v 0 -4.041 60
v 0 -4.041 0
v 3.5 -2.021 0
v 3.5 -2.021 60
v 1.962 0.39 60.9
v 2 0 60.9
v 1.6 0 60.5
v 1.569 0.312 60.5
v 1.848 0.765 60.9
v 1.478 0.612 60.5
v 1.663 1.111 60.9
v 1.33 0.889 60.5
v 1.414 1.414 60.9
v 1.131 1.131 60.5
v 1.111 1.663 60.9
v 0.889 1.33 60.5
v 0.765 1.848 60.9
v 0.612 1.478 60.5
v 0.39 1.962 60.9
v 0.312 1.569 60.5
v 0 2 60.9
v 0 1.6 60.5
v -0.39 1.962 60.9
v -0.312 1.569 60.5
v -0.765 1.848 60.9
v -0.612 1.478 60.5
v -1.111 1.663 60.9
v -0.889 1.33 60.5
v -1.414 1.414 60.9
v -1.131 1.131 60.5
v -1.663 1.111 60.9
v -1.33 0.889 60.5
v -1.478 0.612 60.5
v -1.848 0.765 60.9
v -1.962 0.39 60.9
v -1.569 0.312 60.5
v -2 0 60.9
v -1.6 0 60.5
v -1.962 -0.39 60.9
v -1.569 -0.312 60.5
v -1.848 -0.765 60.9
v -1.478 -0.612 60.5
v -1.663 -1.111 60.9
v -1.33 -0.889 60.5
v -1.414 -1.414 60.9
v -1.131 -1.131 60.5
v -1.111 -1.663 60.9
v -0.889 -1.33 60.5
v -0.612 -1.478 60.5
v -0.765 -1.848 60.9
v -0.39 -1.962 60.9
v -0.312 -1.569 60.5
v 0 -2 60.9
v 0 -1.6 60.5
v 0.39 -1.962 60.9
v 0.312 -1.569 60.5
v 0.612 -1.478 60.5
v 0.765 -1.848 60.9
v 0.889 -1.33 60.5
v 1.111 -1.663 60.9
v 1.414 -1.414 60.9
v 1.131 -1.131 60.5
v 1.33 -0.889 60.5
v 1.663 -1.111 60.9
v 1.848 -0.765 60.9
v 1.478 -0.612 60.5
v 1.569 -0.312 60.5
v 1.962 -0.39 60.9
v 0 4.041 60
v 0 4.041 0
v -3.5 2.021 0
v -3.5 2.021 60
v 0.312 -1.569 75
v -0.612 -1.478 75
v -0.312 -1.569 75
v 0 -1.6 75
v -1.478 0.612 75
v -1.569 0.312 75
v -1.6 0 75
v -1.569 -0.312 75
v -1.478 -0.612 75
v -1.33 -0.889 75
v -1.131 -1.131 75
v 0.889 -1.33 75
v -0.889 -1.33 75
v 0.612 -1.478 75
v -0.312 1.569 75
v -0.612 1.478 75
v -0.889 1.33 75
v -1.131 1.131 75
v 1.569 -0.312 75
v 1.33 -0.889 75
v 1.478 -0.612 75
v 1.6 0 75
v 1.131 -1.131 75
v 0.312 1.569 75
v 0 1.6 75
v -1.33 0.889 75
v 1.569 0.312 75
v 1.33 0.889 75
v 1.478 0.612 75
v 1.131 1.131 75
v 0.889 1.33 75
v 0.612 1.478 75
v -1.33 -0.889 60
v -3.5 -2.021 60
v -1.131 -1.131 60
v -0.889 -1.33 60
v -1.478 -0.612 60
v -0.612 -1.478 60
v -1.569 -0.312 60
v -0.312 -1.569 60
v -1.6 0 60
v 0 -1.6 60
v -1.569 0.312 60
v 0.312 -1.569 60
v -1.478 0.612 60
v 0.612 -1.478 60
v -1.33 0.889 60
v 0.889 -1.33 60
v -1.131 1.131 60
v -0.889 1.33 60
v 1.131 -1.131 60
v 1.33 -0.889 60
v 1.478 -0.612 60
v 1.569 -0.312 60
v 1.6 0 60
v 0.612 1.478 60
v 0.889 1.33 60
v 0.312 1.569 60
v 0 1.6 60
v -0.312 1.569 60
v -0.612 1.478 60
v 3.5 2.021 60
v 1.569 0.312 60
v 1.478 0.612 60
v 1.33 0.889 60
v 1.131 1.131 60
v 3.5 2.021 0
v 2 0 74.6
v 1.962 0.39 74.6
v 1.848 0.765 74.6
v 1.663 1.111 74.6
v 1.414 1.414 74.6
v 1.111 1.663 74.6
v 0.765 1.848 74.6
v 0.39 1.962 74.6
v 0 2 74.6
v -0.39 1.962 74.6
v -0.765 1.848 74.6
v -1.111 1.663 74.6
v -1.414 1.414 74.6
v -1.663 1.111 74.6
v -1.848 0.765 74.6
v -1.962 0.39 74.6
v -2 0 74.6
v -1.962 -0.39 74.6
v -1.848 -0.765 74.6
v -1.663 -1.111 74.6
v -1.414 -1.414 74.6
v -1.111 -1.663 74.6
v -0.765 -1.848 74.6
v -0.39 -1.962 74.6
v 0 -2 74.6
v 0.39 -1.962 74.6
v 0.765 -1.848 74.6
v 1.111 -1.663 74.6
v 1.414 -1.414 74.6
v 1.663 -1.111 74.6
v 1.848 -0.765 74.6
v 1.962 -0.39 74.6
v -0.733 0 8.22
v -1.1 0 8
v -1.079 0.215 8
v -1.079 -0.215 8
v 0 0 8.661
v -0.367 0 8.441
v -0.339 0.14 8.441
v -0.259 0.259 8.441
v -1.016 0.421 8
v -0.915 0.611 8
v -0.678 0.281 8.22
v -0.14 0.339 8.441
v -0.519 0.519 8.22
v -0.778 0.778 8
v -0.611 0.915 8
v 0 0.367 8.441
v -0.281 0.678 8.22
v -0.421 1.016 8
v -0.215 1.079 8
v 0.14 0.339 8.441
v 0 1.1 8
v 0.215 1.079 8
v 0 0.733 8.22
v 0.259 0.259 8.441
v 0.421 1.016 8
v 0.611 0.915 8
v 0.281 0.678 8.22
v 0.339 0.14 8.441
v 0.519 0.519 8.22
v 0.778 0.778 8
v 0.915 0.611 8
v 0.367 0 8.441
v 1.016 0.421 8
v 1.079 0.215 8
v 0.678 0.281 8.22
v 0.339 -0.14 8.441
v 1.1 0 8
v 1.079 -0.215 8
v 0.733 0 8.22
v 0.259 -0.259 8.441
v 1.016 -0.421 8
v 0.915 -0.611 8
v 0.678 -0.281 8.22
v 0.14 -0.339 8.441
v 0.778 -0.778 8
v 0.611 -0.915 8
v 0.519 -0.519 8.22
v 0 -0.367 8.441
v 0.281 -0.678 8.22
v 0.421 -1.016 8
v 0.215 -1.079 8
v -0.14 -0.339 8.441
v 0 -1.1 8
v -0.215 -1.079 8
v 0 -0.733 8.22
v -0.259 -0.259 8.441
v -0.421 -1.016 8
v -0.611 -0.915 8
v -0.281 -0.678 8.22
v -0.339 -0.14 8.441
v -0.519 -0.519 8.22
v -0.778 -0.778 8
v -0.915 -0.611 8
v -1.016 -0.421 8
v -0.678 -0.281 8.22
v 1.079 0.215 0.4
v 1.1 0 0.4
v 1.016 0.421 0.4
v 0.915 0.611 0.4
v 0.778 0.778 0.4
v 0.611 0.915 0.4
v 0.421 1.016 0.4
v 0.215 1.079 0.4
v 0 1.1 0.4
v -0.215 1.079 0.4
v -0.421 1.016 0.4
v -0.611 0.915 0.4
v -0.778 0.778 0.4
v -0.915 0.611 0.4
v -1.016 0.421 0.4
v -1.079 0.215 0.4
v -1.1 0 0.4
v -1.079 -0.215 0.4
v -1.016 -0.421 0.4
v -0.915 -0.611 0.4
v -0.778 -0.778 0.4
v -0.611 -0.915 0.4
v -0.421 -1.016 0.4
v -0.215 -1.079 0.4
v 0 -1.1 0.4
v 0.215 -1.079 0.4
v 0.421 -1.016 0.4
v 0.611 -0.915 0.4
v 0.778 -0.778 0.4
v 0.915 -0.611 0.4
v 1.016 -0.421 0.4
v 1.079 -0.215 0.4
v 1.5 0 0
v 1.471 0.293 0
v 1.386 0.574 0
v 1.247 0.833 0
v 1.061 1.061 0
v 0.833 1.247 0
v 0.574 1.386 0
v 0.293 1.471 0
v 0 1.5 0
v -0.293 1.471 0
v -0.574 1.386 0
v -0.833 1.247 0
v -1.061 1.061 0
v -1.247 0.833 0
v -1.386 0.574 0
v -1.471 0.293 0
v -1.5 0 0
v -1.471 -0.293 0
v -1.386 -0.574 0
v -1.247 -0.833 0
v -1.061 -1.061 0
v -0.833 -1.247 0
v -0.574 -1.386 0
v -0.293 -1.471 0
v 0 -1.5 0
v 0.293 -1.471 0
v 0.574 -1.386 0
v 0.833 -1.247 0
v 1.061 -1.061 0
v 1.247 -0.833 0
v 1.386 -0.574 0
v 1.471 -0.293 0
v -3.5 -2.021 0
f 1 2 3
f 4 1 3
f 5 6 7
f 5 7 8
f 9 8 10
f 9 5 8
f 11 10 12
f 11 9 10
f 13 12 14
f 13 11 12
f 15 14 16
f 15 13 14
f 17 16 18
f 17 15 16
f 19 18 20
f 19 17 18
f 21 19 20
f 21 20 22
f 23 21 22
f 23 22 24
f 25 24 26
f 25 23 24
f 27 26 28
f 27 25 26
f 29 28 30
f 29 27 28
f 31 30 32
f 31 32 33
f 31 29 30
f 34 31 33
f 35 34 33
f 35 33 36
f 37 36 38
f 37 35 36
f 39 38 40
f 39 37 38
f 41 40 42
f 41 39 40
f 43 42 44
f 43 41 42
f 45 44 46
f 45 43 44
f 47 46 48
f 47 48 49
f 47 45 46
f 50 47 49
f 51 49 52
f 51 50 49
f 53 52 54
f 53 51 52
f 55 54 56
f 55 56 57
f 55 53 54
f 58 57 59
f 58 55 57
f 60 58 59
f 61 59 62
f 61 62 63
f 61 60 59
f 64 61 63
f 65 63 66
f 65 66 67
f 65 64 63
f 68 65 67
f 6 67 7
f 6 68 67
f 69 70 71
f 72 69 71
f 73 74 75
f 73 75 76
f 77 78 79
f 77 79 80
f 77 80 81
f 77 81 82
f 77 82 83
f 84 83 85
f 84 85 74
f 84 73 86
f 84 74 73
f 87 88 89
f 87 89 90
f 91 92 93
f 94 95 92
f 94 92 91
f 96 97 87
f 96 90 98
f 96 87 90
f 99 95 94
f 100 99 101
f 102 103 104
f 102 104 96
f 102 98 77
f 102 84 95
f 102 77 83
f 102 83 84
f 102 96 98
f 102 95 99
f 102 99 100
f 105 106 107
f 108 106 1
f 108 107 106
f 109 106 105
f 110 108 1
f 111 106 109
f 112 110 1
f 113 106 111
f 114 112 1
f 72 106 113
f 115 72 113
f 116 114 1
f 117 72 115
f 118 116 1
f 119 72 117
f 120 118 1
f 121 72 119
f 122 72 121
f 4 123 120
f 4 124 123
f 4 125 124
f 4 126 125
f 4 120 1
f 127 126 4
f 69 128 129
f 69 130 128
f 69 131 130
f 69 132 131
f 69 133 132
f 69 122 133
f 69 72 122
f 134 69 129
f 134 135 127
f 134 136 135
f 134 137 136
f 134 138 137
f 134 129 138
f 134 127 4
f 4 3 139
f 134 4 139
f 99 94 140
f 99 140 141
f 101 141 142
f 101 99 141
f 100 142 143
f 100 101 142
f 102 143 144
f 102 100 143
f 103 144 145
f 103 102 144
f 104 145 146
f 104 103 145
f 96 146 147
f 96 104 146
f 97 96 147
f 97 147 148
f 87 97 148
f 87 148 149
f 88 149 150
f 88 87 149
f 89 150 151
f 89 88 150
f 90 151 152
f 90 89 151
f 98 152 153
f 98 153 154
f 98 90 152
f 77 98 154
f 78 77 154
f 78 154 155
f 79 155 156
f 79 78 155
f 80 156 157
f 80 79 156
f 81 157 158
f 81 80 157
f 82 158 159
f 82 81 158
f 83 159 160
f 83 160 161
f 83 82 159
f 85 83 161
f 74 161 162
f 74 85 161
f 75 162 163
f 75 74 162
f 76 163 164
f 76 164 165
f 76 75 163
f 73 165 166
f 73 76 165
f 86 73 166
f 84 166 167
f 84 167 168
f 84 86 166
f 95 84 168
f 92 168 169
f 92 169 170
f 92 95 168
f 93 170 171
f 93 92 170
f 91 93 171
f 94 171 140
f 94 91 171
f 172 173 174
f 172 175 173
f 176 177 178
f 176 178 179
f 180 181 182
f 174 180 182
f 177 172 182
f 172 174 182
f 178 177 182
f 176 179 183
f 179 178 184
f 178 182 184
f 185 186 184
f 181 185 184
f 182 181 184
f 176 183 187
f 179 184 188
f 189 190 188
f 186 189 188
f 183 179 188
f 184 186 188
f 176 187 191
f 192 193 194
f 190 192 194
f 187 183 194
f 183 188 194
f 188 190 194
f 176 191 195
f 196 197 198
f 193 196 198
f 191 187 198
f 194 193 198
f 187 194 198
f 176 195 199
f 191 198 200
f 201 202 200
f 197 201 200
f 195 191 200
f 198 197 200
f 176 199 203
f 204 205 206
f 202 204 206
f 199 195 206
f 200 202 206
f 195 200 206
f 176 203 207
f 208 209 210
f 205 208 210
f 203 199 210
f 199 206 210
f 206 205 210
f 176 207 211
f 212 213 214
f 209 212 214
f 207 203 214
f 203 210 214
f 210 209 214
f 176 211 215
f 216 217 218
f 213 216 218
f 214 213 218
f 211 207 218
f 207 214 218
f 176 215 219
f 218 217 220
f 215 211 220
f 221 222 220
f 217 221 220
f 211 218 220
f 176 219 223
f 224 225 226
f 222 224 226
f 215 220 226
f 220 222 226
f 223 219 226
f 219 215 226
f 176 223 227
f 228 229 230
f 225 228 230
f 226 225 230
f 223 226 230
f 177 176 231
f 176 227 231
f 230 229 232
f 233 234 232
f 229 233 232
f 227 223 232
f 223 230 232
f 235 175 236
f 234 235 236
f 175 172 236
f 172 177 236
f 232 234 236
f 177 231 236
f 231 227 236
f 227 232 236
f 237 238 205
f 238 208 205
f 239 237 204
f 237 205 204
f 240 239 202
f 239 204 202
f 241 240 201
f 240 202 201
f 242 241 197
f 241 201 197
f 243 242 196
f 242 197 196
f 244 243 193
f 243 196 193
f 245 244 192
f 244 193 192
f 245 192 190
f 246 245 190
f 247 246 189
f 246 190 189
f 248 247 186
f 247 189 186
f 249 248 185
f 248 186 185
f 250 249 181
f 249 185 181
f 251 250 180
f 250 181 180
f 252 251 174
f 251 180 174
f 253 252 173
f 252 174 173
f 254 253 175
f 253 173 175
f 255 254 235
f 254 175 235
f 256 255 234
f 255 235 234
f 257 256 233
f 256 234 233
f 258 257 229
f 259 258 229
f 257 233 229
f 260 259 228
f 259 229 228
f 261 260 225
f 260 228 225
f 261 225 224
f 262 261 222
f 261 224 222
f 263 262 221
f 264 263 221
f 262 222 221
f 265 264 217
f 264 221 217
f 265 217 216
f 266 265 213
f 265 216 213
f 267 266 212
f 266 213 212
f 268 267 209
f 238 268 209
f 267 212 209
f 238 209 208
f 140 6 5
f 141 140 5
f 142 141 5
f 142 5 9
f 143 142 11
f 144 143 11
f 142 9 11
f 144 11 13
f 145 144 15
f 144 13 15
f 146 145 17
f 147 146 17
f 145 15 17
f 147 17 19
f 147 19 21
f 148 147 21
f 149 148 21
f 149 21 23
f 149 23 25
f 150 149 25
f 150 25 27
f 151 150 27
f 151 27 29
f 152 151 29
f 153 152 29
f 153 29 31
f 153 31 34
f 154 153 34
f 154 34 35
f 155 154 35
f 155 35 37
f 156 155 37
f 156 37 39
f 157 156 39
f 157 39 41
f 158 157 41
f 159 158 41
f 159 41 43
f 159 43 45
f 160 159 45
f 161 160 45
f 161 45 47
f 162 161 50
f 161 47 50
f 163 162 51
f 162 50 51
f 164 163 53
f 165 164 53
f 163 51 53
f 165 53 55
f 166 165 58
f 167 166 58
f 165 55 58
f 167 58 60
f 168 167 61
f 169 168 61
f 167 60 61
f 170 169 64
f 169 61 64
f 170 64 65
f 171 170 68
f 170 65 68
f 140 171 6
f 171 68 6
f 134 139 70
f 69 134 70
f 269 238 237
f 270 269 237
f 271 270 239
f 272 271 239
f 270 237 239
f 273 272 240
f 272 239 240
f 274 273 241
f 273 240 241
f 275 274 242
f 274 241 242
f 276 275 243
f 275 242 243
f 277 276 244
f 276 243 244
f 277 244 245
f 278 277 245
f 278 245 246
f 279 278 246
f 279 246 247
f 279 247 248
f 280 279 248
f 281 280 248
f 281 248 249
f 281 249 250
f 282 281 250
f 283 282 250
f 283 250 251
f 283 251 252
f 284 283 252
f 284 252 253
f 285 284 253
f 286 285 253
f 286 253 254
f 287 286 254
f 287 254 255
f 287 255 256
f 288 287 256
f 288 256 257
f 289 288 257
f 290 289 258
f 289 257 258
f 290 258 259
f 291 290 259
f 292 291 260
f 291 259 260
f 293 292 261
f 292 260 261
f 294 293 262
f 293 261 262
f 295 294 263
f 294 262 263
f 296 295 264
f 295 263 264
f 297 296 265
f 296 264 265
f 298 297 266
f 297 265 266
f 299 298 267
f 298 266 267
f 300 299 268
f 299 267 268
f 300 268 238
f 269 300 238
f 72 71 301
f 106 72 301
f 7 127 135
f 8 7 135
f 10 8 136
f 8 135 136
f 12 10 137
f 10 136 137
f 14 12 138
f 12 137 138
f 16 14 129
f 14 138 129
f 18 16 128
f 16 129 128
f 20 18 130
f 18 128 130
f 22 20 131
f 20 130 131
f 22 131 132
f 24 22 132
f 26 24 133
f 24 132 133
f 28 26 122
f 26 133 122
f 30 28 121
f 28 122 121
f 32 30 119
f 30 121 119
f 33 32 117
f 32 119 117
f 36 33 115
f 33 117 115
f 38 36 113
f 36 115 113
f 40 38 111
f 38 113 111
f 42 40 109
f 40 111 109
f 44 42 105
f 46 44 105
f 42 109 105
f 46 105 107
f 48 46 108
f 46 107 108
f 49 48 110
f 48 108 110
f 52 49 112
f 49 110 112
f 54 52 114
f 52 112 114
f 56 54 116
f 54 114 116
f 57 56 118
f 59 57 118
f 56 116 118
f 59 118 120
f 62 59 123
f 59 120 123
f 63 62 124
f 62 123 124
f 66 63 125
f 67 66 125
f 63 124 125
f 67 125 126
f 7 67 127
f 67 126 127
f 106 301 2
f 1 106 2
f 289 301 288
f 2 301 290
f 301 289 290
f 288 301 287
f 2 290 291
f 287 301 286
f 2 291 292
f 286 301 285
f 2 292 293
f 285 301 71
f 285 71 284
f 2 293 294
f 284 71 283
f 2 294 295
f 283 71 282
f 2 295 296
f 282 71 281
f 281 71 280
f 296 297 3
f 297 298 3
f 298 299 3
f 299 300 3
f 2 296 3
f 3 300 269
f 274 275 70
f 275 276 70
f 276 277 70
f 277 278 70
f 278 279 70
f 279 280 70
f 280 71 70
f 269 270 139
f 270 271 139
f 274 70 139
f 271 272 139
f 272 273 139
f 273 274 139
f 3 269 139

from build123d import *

# Parameters (mm, degrees)
EXTRUDE_1_DEPTH             = 60
SKETCH_2_R                  = 2
EXTRUDE_2_DEPTH             = 15
SKETCH_3_R                  = 2
SKETCH_3_R_2                = 1.6
CUT_EXTRUDE_3_DEPTH         = 0.5
CHAMFER_1_SIZE              = 0.4
HOLE_WIZARD_M31_D           = 2.2
HOLE_WIZARD_M31_DEPTH       = 8
HOLE_WIZARD_M31_CSINK_D     = 3
HOLE_WIZARD_M31_CSINK_ANGLE = 90
HOLE_WIZARD_M31_TIP         = 0.660946681


with BuildPart() as part:
    # Эскиз1 → Вытянуть1 (new body)
    with BuildSketch(Plane.XY):
        Polygon((0, 4.041451884), (-3.5, 2.020725942), (-3.5, -2.020725942), (0, -4.041451884), (3.5, -2.020725942), (3.5, 2.020725942), align=None)
    extrude(amount=EXTRUDE_1_DEPTH)

    # Эскиз2 → Вытянуть2 (add)
    with BuildSketch(Plane.XY.offset(60)):
        Circle(SKETCH_2_R)
    extrude(amount=EXTRUDE_2_DEPTH)

    # Эскиз3 → Вырез-Вытянуть3 (cut)
    with BuildSketch(Plane.XY.offset(60)):
        Circle(SKETCH_3_R)
        Circle(SKETCH_3_R_2, mode=Mode.SUBTRACT)
    extrude(amount=CUT_EXTRUDE_3_DEPTH, mode=Mode.SUBTRACT)

    # Фаска1
    chamfer_1_edges = [part.edges().sort_by_distance(p)[0] for p in [
        (-2, 0, 75),
        (-2, 0, 60.5),
    ]]
    chamfer(chamfer_1_edges, length=CHAMFER_1_SIZE - 0.0001)  # a hair under: the kernel refuses the full size

    # Отверстие с зазором M31
    with Locations(Plane(origin=(0, 0, 0), x_dir=(-1, 0, 0), z_dir=(0, 0, -1))):
        with Locations((0, 0)):
            CounterSinkHole(HOLE_WIZARD_M31_D / 2, HOLE_WIZARD_M31_CSINK_D / 2, depth=HOLE_WIZARD_M31_DEPTH, counter_sink_angle=HOLE_WIZARD_M31_CSINK_ANGLE)
            with Locations((0, 0, -(HOLE_WIZARD_M31_DEPTH + HOLE_WIZARD_M31_TIP / 2))):  # 118° drill point
                Cone(0, HOLE_WIZARD_M31_D / 2, HOLE_WIZARD_M31_TIP, mode=Mode.SUBTRACT)


solid = part.part
